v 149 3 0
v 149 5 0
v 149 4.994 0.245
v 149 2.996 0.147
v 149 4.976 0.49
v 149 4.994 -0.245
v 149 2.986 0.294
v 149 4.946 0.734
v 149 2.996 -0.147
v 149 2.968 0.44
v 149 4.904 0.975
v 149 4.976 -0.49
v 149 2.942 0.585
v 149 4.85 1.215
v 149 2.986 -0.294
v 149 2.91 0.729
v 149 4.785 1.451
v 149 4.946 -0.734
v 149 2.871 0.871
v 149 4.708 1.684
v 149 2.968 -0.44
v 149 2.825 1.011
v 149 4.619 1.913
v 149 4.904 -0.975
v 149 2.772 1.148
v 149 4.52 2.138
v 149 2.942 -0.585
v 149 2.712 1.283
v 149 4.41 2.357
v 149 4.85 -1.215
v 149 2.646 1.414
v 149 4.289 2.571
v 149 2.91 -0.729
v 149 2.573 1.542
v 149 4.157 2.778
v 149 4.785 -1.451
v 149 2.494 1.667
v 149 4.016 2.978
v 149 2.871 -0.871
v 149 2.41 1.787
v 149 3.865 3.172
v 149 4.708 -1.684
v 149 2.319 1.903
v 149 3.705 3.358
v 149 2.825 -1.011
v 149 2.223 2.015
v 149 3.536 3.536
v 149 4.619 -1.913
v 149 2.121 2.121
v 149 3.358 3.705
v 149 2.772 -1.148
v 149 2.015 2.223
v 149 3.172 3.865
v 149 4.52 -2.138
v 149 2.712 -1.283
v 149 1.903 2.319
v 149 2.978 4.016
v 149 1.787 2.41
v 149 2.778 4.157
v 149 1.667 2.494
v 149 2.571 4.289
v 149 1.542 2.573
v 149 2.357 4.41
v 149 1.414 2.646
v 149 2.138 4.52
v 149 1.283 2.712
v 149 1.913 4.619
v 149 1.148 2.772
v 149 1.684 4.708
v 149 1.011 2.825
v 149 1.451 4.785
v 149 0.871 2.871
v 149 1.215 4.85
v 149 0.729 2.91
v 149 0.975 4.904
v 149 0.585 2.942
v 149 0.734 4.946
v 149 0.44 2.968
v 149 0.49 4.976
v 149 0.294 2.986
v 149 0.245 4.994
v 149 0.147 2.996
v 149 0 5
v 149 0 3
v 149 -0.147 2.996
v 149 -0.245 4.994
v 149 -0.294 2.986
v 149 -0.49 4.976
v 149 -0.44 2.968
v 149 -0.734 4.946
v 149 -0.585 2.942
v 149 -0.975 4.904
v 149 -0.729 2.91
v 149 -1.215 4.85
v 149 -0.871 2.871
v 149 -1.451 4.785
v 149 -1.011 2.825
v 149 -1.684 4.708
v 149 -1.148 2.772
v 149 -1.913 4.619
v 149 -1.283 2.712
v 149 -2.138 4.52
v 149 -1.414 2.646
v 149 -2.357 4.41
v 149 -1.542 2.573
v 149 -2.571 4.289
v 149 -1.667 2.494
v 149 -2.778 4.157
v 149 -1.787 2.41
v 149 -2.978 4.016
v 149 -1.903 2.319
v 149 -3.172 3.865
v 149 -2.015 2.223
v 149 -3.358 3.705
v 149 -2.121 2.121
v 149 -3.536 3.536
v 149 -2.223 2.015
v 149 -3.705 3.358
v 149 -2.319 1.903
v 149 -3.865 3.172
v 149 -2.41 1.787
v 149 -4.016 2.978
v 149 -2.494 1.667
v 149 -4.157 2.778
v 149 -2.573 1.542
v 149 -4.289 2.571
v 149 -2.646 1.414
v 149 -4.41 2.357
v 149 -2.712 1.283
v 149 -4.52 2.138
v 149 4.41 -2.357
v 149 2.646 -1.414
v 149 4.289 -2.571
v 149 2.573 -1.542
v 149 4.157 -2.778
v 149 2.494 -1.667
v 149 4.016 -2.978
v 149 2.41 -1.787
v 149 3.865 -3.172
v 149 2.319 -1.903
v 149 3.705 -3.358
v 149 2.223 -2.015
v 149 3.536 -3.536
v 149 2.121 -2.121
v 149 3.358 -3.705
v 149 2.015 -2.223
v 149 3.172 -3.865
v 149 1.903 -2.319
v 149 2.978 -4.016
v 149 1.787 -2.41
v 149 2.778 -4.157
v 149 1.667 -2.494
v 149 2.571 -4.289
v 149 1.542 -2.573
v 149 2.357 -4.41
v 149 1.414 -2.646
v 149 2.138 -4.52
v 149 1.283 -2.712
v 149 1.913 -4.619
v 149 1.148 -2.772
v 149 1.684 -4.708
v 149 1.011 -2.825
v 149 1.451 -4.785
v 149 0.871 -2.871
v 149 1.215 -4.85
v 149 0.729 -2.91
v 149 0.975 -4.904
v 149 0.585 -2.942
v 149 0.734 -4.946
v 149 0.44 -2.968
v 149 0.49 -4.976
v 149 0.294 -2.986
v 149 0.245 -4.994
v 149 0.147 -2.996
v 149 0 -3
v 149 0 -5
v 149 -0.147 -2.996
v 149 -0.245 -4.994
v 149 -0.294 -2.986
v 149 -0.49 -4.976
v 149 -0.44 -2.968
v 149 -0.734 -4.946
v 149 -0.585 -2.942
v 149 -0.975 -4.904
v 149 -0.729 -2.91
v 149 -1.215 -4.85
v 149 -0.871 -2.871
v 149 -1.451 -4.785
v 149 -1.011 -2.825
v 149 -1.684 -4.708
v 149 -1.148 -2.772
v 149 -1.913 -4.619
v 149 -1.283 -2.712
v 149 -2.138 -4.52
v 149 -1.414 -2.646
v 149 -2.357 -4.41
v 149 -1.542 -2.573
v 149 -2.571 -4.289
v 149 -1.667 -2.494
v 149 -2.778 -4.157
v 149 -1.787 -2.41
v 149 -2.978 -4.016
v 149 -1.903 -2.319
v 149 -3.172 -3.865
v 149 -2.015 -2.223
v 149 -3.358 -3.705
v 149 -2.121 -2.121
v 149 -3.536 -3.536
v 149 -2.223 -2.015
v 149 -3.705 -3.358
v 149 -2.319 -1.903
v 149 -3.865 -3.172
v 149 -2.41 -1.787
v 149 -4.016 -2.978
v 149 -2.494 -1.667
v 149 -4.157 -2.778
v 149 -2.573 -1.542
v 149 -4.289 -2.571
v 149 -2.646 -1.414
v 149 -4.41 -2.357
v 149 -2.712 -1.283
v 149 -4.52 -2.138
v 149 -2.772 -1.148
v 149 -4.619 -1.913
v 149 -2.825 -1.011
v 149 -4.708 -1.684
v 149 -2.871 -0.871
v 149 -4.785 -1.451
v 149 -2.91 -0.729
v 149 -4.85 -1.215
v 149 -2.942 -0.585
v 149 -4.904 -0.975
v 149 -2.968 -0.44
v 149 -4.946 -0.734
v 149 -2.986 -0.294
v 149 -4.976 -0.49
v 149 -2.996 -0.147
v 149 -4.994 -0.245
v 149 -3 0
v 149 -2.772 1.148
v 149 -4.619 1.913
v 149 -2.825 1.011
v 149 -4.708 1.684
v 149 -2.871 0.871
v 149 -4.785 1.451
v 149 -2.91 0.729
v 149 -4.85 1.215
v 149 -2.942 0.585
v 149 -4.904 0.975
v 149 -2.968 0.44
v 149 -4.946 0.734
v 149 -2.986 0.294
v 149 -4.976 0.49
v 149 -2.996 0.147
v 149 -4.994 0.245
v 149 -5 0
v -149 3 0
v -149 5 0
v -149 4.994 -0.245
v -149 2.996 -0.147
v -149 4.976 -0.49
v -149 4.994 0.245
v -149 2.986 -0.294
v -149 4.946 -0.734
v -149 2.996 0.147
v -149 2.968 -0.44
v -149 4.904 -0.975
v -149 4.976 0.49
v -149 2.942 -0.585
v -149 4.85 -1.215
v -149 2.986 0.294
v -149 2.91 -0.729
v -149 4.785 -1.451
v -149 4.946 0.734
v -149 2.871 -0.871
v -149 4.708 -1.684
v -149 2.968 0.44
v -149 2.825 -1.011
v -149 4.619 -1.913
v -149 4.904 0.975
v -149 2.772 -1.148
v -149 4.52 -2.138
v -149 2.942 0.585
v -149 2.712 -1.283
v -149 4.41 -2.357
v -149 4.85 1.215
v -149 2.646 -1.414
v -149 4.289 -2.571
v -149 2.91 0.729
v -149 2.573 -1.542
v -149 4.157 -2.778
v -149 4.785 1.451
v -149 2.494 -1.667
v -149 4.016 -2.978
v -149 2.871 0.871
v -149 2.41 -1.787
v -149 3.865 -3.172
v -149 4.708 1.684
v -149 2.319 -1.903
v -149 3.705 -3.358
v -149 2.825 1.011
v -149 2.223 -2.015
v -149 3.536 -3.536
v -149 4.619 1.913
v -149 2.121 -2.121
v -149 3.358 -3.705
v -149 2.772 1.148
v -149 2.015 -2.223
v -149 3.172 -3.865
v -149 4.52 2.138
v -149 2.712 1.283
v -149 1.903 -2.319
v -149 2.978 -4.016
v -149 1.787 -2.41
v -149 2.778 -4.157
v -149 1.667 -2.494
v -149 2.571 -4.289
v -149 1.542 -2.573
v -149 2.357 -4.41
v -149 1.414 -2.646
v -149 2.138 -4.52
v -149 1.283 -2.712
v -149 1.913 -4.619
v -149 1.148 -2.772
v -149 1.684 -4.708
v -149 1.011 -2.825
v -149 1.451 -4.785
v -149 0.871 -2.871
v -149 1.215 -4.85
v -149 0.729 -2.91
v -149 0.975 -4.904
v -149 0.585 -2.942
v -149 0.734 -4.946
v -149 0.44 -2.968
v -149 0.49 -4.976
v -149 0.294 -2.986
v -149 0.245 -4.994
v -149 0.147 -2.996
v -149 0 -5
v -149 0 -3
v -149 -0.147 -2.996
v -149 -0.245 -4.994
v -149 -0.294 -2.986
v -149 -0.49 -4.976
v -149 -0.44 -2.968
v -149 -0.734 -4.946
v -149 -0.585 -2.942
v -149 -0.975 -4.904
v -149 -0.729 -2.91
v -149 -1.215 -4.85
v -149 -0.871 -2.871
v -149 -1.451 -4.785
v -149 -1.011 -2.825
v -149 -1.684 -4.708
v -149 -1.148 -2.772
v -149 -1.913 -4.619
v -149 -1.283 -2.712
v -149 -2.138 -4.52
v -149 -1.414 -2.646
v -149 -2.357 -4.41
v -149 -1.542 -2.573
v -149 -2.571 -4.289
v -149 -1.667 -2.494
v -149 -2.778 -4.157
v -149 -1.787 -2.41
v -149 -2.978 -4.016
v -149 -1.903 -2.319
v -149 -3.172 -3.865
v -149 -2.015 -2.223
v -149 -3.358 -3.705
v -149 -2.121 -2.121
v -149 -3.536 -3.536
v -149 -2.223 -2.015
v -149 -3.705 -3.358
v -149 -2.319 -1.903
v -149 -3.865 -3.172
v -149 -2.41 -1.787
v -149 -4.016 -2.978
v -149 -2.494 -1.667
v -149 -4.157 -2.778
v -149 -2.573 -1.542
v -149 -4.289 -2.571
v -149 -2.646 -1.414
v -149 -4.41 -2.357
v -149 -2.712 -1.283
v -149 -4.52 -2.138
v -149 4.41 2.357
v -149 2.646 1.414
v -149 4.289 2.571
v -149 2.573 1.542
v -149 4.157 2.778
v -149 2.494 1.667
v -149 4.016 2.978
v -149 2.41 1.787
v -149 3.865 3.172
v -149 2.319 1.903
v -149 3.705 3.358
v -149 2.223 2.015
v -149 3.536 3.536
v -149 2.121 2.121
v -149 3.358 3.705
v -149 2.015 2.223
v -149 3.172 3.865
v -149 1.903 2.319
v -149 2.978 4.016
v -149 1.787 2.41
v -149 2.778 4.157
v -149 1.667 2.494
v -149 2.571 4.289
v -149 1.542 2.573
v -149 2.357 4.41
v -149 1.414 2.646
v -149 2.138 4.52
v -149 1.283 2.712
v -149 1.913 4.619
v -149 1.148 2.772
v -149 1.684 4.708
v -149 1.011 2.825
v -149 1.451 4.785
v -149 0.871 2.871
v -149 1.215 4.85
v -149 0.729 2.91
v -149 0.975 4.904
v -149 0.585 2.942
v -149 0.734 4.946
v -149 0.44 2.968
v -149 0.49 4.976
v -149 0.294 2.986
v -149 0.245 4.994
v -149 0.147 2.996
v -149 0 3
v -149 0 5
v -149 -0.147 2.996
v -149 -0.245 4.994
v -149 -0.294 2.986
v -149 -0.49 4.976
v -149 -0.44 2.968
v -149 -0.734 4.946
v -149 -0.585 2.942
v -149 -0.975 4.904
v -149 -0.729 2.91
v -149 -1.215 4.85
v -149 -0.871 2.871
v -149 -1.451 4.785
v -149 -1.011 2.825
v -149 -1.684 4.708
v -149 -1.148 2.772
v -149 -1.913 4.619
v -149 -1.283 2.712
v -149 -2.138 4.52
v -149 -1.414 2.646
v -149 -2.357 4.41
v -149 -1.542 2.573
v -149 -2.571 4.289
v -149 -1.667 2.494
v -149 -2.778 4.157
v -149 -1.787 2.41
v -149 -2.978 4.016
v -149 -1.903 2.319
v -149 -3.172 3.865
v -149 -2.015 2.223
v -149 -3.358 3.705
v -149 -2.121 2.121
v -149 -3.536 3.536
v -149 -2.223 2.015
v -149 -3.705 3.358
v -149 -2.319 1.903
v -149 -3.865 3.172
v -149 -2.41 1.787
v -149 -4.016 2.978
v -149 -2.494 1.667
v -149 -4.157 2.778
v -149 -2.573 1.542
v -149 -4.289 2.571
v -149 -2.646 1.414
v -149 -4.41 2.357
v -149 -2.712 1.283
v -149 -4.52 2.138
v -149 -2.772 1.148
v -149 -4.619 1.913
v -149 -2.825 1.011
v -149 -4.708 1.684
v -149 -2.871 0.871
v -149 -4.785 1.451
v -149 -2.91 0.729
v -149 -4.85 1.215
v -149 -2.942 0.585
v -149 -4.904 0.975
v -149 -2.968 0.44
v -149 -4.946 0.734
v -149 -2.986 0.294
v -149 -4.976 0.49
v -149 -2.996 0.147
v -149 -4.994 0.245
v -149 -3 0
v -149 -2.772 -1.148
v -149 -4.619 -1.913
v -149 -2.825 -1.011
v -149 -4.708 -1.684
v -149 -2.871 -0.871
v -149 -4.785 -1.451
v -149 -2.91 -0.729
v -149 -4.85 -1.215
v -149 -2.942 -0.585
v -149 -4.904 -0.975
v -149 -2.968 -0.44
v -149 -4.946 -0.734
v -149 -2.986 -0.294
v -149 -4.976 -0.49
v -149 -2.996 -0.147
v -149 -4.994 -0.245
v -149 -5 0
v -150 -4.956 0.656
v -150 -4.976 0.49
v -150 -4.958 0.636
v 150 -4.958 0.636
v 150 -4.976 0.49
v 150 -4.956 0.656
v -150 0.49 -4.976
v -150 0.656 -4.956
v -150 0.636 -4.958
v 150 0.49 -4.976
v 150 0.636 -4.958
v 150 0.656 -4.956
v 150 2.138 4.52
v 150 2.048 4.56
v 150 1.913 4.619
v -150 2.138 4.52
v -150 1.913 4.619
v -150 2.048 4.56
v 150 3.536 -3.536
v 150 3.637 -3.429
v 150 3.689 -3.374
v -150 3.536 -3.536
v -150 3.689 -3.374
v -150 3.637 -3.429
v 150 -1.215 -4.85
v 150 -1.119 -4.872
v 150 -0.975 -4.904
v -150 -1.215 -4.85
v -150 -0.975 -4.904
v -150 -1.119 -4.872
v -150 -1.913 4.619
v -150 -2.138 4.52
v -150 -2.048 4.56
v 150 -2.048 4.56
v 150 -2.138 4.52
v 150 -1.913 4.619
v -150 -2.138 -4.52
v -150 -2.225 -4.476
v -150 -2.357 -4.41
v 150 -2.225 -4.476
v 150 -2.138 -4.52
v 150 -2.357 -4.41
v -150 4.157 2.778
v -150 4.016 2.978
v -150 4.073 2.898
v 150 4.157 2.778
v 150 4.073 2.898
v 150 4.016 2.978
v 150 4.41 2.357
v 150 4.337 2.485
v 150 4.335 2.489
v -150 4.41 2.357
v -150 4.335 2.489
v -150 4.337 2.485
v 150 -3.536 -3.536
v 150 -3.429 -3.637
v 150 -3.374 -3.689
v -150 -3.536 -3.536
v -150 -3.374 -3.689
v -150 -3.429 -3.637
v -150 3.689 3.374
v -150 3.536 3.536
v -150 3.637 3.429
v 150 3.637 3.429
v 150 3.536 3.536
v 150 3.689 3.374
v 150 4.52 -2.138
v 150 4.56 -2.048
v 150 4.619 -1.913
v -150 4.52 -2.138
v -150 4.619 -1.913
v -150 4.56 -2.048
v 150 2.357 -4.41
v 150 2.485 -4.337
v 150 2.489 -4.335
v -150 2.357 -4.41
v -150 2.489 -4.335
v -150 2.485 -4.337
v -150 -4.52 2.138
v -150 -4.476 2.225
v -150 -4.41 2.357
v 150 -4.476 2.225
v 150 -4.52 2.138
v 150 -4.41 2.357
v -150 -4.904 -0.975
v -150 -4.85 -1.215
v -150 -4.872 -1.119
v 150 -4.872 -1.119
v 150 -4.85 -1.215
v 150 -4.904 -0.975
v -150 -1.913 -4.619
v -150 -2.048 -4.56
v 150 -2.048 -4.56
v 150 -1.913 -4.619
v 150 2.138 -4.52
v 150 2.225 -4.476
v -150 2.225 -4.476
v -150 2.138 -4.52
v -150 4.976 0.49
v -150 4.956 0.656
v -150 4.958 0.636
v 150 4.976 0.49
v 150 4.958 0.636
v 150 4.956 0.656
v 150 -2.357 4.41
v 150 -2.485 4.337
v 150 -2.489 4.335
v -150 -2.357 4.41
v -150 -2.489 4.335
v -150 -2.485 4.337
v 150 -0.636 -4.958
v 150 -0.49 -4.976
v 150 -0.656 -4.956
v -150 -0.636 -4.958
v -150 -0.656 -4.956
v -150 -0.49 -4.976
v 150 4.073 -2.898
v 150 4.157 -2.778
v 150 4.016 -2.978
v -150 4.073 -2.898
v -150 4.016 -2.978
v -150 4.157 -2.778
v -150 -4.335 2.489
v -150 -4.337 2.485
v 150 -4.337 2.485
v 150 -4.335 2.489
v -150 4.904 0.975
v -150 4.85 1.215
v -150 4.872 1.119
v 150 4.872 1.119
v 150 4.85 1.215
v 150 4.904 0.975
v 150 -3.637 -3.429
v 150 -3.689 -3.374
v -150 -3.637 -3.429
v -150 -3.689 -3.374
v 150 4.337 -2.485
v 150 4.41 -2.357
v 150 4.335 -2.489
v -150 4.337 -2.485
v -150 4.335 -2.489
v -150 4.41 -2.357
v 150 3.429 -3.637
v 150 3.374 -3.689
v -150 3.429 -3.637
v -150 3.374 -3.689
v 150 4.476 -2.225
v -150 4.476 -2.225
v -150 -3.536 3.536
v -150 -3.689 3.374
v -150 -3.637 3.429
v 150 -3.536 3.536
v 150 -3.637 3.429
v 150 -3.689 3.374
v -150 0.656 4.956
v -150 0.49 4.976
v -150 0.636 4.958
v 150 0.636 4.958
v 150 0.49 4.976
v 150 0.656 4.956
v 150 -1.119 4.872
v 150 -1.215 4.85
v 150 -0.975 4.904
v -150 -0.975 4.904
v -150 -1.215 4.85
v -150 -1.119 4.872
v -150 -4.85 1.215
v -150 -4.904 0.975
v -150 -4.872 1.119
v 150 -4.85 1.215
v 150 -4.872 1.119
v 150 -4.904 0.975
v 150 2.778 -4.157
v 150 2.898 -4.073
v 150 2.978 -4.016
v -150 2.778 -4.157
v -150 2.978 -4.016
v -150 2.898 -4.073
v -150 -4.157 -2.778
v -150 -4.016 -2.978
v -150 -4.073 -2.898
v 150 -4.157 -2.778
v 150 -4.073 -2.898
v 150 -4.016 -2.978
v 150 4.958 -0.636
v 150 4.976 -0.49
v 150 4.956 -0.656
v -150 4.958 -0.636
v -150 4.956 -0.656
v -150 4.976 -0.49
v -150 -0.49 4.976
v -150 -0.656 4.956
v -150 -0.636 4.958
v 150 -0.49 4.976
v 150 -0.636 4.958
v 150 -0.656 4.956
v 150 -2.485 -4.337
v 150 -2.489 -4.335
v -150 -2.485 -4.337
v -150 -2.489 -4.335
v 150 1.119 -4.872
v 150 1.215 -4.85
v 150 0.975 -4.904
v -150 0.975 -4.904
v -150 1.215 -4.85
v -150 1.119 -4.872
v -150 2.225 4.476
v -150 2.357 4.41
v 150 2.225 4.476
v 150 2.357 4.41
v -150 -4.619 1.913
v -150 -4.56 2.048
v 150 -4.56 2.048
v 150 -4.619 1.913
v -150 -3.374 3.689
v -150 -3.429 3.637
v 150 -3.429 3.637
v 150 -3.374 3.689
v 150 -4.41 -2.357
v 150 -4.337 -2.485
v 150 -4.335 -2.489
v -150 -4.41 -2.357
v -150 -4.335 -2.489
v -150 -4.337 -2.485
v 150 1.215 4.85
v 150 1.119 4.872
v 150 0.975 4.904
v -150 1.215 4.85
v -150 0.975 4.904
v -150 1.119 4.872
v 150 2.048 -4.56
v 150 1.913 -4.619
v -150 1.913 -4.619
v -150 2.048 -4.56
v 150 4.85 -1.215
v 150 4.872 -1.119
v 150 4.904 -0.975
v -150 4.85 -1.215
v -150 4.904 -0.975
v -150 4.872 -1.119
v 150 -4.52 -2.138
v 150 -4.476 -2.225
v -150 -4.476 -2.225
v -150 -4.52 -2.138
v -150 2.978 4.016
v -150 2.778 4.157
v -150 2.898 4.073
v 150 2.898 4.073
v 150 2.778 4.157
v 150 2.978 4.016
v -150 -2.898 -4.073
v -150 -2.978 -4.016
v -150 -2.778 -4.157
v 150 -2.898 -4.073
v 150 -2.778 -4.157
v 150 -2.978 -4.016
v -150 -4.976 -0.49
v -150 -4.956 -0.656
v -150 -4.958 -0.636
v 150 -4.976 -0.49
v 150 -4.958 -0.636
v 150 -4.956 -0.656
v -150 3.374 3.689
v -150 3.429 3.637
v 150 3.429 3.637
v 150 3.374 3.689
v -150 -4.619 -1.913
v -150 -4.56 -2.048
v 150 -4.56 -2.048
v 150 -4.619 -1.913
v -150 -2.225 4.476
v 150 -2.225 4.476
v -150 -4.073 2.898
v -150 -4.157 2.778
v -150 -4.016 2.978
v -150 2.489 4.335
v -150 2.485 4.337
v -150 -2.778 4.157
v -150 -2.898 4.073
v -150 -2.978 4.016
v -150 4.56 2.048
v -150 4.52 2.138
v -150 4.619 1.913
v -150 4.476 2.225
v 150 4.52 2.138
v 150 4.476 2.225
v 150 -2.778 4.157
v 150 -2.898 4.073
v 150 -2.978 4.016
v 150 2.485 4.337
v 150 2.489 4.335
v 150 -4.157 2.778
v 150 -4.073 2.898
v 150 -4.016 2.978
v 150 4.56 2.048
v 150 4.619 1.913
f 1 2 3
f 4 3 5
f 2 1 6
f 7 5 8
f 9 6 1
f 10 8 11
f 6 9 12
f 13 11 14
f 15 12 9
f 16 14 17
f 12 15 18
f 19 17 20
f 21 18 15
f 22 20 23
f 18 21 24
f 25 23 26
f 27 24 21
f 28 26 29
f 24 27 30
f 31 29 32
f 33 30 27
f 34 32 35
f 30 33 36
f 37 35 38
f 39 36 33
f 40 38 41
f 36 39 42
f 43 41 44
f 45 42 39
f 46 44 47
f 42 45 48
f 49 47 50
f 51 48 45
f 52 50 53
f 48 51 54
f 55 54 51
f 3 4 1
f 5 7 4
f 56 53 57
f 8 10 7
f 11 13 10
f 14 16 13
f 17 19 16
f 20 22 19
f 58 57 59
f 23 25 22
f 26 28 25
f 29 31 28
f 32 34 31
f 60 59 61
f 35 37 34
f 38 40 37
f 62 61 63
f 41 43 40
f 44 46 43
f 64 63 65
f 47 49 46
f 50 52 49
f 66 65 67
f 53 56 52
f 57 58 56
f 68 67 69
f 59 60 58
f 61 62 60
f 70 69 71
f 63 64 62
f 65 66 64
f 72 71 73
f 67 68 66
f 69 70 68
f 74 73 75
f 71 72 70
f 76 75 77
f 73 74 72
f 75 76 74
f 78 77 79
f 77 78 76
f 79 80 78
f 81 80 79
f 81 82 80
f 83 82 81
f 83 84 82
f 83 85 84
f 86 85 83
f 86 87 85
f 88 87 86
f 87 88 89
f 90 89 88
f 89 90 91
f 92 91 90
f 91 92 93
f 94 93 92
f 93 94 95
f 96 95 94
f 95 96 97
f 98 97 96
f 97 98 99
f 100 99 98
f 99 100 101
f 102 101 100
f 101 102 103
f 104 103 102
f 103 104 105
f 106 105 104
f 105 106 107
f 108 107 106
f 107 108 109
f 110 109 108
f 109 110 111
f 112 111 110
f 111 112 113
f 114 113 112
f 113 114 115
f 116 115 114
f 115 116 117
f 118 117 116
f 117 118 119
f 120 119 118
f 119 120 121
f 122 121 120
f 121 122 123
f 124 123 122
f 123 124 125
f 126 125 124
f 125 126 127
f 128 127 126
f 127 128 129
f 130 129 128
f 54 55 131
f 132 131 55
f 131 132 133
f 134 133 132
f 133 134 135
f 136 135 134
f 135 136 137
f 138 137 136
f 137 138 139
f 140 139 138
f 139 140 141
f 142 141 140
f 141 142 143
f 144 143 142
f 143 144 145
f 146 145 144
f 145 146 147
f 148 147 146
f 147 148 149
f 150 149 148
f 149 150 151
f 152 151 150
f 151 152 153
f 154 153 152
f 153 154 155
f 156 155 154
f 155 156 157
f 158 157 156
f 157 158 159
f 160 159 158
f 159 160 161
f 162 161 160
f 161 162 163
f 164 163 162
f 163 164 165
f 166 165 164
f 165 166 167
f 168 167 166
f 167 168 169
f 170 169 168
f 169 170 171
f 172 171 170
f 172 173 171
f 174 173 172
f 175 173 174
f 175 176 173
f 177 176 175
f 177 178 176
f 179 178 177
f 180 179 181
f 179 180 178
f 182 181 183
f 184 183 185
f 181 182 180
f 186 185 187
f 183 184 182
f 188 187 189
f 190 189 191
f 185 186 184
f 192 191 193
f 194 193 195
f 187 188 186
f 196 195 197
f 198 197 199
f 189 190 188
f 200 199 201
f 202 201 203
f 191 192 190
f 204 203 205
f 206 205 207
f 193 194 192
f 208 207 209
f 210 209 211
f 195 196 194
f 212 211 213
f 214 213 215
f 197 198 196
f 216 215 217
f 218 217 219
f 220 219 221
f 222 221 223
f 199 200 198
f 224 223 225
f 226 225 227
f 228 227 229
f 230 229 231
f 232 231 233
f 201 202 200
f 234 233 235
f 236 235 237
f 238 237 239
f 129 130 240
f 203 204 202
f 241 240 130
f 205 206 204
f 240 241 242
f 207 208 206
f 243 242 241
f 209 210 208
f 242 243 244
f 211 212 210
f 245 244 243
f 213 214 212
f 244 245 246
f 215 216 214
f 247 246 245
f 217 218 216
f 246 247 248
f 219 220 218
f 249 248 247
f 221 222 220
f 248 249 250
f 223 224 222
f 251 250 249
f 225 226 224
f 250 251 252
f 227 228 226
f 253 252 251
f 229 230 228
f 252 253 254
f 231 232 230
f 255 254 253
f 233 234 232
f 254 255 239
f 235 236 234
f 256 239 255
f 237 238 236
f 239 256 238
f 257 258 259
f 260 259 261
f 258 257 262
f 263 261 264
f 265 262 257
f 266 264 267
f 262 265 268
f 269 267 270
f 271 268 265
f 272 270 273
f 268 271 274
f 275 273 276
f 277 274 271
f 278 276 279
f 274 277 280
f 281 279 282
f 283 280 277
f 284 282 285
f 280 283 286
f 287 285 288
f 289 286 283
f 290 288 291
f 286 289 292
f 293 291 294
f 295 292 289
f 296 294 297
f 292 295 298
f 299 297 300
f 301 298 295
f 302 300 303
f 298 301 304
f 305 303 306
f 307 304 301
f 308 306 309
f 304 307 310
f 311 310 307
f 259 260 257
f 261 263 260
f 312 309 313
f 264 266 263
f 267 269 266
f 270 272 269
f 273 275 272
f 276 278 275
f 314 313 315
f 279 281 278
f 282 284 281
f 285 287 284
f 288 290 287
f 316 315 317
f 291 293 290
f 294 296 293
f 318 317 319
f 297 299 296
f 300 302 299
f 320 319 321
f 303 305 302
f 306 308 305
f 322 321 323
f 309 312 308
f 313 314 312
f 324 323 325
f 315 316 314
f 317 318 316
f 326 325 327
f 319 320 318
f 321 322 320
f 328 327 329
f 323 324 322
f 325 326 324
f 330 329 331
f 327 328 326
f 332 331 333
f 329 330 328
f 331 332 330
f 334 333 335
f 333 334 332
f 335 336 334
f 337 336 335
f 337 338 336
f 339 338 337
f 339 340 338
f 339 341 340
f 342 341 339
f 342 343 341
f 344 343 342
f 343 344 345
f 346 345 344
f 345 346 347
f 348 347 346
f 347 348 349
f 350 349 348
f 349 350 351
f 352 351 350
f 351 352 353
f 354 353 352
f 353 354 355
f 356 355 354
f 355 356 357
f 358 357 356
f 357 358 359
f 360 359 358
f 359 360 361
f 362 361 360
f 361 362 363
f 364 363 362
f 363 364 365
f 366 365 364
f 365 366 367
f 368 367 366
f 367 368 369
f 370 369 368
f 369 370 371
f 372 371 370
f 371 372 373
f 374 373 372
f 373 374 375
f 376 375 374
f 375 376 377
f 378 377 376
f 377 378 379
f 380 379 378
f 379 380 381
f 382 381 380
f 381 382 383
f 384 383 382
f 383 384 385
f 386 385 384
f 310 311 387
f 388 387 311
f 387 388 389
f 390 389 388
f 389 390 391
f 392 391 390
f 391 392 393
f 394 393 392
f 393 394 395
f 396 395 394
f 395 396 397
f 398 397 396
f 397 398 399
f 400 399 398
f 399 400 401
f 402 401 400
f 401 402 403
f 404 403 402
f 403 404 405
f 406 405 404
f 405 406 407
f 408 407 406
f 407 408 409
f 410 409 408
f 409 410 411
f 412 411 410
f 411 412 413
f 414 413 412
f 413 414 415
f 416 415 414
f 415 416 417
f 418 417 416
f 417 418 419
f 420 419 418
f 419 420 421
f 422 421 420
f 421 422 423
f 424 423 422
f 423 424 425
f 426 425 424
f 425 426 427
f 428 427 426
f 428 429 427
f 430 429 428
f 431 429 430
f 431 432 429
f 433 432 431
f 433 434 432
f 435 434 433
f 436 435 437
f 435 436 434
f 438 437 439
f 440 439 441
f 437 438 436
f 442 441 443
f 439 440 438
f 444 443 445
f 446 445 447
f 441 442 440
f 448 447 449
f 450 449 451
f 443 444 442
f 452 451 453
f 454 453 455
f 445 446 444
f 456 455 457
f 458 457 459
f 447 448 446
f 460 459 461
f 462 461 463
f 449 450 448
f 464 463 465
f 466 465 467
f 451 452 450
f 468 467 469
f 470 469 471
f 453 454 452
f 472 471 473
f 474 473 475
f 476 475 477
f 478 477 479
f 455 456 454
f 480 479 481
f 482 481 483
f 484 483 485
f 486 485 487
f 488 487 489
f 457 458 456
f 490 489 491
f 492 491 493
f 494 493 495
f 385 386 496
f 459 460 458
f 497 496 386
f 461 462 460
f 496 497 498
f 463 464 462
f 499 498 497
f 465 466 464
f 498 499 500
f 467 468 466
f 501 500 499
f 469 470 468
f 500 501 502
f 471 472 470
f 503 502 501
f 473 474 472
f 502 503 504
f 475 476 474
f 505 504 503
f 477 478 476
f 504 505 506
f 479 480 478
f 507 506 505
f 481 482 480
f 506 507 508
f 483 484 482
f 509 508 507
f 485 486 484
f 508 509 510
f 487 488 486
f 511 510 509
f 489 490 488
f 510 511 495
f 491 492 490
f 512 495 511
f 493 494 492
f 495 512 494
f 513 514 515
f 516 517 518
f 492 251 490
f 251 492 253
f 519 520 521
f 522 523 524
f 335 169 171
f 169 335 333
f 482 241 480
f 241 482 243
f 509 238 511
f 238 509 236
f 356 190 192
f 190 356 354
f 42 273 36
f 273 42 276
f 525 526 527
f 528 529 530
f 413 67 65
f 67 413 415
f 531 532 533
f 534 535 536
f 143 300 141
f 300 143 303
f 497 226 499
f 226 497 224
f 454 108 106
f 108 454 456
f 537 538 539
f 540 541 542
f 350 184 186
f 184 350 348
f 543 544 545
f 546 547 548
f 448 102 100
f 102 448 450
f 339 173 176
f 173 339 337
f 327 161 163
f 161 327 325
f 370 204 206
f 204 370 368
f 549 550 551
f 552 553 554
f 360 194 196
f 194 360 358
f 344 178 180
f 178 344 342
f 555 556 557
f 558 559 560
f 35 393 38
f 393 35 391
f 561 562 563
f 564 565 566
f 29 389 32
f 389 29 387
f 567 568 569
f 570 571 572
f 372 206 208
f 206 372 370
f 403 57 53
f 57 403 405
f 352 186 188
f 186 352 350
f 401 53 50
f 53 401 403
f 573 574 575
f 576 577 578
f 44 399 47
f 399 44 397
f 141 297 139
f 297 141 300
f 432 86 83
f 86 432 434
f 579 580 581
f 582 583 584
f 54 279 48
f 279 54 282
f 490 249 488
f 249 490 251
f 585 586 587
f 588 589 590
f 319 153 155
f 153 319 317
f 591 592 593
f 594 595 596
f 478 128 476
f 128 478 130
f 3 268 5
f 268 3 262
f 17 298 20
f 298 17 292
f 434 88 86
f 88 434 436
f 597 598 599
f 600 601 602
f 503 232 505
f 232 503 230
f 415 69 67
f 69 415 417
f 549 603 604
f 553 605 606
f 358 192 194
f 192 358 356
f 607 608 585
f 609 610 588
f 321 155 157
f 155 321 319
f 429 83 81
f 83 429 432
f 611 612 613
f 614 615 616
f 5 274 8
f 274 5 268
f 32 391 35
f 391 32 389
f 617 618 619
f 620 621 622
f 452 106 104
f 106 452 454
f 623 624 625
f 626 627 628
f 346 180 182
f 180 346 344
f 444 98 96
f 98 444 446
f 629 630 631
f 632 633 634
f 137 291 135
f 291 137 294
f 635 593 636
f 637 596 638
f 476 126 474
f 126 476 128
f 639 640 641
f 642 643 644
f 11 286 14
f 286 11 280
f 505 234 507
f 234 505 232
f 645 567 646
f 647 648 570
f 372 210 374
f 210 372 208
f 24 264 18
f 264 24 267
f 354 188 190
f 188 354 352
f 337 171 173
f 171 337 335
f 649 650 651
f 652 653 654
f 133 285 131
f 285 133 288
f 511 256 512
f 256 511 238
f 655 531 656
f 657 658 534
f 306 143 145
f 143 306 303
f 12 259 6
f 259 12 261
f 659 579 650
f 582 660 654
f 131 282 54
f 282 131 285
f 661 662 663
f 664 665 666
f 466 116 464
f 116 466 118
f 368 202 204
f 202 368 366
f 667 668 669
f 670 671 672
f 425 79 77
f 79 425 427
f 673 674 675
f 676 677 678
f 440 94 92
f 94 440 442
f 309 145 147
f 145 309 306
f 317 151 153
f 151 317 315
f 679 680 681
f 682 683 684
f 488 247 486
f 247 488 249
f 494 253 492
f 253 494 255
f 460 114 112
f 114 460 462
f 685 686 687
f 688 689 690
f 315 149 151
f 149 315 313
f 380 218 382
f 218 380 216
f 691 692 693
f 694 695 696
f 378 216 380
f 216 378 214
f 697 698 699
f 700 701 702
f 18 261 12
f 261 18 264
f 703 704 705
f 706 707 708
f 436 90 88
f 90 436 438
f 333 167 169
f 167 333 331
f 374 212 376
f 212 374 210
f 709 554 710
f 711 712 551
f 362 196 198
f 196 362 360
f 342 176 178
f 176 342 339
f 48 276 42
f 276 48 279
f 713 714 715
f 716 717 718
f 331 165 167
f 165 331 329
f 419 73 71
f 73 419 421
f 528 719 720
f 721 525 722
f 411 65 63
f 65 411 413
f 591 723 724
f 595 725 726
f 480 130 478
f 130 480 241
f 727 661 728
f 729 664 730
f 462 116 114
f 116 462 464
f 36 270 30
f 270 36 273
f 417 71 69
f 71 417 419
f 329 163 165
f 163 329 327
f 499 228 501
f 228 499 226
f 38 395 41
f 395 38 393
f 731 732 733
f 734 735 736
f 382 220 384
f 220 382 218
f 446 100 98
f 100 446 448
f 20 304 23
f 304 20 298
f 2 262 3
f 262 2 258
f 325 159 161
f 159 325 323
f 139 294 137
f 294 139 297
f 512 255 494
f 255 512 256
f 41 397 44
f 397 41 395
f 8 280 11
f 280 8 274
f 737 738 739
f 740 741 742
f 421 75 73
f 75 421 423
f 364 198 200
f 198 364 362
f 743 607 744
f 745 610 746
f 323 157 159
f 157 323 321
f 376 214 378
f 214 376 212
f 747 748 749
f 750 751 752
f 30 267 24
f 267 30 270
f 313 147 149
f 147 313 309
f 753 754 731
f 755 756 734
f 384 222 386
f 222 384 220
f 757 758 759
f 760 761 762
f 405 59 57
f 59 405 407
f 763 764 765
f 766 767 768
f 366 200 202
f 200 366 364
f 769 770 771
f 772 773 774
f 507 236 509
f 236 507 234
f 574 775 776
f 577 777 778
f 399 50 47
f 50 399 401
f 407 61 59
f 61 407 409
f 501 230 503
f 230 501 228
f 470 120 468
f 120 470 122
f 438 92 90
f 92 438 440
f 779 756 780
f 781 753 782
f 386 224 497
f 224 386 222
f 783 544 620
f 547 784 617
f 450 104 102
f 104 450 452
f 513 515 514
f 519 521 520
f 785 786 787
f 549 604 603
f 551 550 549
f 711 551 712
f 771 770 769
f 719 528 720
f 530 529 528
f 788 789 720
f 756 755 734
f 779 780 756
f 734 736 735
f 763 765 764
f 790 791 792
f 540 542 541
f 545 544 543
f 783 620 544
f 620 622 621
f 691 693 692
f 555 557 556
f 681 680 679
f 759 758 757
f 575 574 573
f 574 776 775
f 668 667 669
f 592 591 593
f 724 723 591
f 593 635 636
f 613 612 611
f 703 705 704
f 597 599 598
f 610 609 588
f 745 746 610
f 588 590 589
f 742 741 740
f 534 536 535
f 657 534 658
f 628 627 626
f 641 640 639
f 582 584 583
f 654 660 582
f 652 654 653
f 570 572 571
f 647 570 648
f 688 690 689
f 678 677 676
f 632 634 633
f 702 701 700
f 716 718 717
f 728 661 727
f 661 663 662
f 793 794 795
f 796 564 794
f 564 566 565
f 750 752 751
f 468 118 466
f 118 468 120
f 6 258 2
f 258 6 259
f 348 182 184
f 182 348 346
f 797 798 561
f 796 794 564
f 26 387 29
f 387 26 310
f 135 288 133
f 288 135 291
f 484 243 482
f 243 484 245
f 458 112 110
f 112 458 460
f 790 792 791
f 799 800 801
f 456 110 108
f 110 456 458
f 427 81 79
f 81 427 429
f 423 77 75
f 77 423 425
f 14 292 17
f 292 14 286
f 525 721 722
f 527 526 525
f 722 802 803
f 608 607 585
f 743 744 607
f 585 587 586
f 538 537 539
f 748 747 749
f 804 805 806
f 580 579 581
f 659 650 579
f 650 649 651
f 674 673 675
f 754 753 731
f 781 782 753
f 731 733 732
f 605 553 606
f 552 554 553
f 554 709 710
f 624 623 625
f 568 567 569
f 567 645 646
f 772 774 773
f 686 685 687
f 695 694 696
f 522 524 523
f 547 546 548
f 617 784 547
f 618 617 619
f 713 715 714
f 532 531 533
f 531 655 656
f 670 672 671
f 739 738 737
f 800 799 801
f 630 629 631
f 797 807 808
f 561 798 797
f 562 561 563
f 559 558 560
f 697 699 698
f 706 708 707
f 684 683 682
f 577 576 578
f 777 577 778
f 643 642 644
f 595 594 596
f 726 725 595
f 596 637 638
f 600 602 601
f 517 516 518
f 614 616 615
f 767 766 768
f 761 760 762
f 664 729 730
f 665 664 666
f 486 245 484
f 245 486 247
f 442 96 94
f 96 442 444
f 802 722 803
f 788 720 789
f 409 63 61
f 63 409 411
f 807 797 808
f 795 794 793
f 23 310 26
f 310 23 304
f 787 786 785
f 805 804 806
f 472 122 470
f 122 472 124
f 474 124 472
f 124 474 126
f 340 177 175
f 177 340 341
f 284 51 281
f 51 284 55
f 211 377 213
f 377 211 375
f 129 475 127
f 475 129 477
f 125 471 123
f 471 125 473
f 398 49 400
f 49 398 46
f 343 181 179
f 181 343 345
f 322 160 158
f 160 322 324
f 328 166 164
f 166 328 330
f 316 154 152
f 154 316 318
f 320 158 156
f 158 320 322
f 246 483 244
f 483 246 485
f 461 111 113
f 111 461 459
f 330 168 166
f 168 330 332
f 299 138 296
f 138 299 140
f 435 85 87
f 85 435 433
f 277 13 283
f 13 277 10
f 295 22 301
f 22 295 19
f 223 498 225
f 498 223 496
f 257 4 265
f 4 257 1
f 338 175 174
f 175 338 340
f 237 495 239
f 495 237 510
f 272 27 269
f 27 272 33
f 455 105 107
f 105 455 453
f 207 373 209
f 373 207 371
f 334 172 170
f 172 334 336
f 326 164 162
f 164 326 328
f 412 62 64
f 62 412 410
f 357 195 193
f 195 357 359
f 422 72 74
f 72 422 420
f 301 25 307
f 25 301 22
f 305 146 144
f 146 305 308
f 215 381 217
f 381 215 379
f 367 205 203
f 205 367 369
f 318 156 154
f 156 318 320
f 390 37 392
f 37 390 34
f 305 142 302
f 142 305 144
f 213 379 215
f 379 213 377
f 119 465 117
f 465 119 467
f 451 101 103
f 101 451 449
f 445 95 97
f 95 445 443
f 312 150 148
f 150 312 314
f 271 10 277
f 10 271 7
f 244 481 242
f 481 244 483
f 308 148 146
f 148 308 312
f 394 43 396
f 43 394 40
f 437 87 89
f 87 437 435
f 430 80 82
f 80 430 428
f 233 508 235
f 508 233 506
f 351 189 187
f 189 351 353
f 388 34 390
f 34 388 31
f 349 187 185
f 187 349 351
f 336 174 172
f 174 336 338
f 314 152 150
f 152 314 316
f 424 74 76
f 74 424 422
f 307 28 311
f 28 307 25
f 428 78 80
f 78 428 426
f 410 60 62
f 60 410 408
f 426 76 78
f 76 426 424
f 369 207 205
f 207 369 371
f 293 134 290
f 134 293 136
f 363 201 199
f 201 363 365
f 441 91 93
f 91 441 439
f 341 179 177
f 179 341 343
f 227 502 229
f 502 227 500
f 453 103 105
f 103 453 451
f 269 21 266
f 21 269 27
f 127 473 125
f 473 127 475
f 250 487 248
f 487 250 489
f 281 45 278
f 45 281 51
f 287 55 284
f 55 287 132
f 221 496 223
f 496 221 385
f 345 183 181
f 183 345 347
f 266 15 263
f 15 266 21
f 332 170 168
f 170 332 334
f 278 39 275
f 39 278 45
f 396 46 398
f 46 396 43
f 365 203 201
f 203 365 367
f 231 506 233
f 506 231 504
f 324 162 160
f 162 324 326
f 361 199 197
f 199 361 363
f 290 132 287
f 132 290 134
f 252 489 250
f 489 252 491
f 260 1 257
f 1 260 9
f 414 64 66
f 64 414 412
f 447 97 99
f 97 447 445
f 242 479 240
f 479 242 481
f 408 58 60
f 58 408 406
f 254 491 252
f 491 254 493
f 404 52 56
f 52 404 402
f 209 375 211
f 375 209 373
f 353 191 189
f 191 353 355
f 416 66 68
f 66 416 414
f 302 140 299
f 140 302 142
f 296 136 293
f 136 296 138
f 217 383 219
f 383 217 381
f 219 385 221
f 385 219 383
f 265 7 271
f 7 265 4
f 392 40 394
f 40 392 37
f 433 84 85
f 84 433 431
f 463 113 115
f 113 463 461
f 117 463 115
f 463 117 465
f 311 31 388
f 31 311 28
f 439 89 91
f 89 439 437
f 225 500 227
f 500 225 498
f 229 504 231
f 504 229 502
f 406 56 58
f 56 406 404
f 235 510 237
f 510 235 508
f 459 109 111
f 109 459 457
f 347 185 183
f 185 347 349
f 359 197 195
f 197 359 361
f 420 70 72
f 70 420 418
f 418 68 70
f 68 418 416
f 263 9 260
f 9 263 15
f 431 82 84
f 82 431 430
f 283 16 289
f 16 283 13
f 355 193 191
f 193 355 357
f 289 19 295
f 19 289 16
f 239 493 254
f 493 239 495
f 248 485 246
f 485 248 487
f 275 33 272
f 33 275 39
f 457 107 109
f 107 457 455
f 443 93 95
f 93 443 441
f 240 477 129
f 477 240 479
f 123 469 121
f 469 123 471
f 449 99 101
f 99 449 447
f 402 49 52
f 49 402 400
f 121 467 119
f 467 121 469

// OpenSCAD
// Neoprene tubing (hollow) — single connected solid
// Oriented along X so front/back/left/right orthographic views show the tube length.

// Parameters
tube_length    = 300; //[150:600:1]
outer_diameter = 10;  //[5:20:0.5]
inner_diameter = 6;   //[3:12:0.5]
end_chamfer    = 0.5; //[0:2:0.1]
overlap        = 1;   //[0.5:2:0.1]

$fn = 128;

// Derived
outer_r = outer_diameter/2;
inner_r = min(inner_diameter/2, outer_r - 0.01);          // ensure valid wall thickness
ch      = min(end_chamfer, tube_length/2 - 0.01);
eps     = 0.01;

// Main tube with inner bore and subtle end chamfers
module neoprene_tube() {
    difference() {
        // Outer body (along X)
        rotate([0,90,0])
            cylinder(h=tube_length, r=outer_r, center=true);

        // Inner bore (extends beyond ends to guarantee through-hole)
        rotate([0,90,0])
            cylinder(h=tube_length + 2*overlap, r=inner_r, center=true);

        // End chamfer cuts (ring frustums) — remove only the outer edge, keep bore open
        // +X end
        translate([ tube_length/2 - ch/2, 0, 0])
            rotate([0,90,0])
                difference() {
                    cylinder(h=ch + overlap, r1=outer_r + overlap, r2=outer_r - ch, center=true);
                    cylinder(h=ch + 3*overlap, r=inner_r - eps, center=true);
                }

        // -X end
        translate([-tube_length/2 + ch/2, 0, 0])
            rotate([0,90,0])
                difference() {
                    cylinder(h=ch + overlap, r1=outer_r - ch, r2=outer_r + overlap, center=true);
                    cylinder(h=ch + 3*overlap, r=inner_r - eps, center=true);
                }
    }
}

// Final Output
color([0.2, 0.2, 0.2])
neoprene_tube();
